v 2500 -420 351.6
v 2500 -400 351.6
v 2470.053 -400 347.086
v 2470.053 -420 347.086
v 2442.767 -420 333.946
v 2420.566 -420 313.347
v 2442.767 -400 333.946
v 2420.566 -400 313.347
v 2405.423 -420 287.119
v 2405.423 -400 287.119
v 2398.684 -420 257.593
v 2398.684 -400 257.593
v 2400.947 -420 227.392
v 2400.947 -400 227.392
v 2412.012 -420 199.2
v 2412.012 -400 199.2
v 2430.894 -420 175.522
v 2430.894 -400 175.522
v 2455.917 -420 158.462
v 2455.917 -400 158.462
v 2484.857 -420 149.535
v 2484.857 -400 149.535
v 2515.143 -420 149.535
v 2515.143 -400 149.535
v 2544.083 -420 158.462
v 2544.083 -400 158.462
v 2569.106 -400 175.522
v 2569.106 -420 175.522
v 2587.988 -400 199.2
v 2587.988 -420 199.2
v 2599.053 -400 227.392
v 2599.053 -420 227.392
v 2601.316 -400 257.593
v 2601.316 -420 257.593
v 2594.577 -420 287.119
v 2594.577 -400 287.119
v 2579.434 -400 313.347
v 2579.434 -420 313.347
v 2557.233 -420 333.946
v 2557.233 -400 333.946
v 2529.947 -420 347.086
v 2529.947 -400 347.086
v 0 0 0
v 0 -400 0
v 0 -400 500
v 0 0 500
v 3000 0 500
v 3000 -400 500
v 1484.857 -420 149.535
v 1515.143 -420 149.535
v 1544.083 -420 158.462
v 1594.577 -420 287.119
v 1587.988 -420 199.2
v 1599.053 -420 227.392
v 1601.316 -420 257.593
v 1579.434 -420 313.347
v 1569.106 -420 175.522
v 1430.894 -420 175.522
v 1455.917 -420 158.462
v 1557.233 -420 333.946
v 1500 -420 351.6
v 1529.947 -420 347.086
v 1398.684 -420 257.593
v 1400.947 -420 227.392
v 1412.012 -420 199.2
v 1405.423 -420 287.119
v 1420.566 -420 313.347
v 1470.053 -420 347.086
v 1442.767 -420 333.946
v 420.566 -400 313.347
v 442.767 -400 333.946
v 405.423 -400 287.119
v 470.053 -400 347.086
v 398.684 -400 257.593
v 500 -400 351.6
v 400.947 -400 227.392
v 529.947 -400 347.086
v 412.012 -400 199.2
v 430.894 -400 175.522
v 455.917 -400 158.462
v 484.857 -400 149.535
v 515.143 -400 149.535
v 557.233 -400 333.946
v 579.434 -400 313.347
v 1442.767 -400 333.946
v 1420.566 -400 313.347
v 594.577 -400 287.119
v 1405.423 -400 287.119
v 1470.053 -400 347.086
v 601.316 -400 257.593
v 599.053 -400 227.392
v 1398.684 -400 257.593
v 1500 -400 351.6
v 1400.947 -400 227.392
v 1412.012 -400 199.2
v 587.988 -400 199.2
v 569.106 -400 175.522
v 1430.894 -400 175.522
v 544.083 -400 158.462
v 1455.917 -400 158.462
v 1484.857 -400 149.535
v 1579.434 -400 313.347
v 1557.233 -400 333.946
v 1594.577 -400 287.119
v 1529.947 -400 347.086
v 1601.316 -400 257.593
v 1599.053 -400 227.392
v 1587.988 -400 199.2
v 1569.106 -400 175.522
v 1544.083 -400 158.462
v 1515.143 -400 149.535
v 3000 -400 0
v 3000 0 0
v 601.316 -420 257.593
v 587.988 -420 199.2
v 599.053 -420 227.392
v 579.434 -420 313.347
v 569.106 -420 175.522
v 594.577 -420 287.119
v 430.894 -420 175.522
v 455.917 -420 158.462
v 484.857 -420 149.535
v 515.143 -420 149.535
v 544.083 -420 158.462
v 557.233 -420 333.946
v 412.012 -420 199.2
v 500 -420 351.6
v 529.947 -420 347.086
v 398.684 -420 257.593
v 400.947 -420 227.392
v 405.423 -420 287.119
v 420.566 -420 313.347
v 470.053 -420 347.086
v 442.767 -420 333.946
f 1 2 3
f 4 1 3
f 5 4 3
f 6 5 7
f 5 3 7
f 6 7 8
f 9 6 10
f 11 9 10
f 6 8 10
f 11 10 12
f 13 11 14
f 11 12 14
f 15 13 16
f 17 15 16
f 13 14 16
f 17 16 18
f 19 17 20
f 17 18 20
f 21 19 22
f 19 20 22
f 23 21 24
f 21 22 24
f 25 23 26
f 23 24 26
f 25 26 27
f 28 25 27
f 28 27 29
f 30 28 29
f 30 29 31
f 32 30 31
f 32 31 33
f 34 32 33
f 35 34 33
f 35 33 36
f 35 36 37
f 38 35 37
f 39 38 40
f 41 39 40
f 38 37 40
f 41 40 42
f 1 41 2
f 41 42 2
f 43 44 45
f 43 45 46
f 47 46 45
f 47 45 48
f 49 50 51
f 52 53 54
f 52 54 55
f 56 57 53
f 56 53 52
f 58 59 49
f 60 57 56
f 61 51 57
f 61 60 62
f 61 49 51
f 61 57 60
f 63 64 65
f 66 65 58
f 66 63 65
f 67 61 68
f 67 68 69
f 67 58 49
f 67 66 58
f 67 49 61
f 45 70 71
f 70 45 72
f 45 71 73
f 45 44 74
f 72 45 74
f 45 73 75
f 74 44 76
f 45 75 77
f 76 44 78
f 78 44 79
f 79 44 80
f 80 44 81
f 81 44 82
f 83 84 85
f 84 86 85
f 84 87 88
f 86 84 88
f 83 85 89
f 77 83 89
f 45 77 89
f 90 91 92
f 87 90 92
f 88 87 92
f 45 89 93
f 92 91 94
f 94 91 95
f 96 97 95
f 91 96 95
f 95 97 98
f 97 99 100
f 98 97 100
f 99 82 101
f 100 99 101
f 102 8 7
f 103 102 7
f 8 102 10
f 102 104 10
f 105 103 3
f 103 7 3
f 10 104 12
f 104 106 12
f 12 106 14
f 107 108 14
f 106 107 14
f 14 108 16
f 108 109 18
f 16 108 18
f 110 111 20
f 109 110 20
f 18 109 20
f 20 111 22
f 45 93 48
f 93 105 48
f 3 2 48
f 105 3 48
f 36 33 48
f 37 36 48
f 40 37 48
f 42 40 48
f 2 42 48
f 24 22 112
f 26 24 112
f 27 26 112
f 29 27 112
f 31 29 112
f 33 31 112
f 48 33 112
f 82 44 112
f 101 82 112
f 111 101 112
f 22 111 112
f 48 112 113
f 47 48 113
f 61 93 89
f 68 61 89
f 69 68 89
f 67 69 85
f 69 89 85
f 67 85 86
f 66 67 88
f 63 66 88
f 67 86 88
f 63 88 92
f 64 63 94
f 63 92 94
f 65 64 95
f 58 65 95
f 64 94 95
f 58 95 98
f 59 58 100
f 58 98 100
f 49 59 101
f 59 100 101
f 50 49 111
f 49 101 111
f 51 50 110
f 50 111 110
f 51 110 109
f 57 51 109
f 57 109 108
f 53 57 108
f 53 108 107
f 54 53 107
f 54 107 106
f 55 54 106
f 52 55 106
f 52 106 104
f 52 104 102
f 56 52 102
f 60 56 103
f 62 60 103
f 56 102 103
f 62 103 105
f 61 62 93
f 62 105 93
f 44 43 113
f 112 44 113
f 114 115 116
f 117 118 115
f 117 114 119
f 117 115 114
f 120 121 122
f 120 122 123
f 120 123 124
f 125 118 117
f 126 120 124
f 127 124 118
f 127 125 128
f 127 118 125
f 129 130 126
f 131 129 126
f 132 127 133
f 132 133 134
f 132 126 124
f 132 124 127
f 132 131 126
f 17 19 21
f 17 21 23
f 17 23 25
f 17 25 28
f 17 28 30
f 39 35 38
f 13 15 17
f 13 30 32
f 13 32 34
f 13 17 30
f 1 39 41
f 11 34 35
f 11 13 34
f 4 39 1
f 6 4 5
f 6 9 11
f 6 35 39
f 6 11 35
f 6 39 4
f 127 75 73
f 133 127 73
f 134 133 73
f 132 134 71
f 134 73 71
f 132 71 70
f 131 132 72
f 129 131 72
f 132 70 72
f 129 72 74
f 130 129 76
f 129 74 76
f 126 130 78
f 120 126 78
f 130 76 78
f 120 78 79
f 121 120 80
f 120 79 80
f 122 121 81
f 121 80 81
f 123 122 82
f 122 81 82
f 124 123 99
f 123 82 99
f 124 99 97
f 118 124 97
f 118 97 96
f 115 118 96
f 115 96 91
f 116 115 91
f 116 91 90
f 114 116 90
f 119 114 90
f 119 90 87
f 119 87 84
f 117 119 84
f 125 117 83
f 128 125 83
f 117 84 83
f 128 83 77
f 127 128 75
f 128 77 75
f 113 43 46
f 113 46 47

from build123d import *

# Parameters (mm, degrees)
CROQUIS1_W              = 3000
CROQUIS1_H              = 400
SALIENTE_EXTRUIR1_DEPTH = 500
CROQUIS2_R              = 101.6
SALIENTE_EXTRUIR2_DEPTH = 20


with BuildPart() as part:
    # Croquis1 → Saliente-Extruir1 (new body)
    with BuildSketch(Plane.XY):
        with Locations((1500, -200)):
            Rectangle(CROQUIS1_W, CROQUIS1_H)
    extrude(amount=SALIENTE_EXTRUIR1_DEPTH)

    # Croquis2 → Saliente-Extruir2 (add)
    with BuildSketch(Plane.XZ.offset(400)):
        with Locations(Location((2500, 250, 0), (0, 0, 90))):
            Circle(CROQUIS2_R)
        with Locations(Location((500, 250, 0), (0, 0, 90))):
            Circle(CROQUIS2_R)
        with Locations(Location((1500, 250, 0), (0, 0, 90))):
            Circle(CROQUIS2_R)
    extrude(amount=SALIENTE_EXTRUIR2_DEPTH)


solid = part.part
